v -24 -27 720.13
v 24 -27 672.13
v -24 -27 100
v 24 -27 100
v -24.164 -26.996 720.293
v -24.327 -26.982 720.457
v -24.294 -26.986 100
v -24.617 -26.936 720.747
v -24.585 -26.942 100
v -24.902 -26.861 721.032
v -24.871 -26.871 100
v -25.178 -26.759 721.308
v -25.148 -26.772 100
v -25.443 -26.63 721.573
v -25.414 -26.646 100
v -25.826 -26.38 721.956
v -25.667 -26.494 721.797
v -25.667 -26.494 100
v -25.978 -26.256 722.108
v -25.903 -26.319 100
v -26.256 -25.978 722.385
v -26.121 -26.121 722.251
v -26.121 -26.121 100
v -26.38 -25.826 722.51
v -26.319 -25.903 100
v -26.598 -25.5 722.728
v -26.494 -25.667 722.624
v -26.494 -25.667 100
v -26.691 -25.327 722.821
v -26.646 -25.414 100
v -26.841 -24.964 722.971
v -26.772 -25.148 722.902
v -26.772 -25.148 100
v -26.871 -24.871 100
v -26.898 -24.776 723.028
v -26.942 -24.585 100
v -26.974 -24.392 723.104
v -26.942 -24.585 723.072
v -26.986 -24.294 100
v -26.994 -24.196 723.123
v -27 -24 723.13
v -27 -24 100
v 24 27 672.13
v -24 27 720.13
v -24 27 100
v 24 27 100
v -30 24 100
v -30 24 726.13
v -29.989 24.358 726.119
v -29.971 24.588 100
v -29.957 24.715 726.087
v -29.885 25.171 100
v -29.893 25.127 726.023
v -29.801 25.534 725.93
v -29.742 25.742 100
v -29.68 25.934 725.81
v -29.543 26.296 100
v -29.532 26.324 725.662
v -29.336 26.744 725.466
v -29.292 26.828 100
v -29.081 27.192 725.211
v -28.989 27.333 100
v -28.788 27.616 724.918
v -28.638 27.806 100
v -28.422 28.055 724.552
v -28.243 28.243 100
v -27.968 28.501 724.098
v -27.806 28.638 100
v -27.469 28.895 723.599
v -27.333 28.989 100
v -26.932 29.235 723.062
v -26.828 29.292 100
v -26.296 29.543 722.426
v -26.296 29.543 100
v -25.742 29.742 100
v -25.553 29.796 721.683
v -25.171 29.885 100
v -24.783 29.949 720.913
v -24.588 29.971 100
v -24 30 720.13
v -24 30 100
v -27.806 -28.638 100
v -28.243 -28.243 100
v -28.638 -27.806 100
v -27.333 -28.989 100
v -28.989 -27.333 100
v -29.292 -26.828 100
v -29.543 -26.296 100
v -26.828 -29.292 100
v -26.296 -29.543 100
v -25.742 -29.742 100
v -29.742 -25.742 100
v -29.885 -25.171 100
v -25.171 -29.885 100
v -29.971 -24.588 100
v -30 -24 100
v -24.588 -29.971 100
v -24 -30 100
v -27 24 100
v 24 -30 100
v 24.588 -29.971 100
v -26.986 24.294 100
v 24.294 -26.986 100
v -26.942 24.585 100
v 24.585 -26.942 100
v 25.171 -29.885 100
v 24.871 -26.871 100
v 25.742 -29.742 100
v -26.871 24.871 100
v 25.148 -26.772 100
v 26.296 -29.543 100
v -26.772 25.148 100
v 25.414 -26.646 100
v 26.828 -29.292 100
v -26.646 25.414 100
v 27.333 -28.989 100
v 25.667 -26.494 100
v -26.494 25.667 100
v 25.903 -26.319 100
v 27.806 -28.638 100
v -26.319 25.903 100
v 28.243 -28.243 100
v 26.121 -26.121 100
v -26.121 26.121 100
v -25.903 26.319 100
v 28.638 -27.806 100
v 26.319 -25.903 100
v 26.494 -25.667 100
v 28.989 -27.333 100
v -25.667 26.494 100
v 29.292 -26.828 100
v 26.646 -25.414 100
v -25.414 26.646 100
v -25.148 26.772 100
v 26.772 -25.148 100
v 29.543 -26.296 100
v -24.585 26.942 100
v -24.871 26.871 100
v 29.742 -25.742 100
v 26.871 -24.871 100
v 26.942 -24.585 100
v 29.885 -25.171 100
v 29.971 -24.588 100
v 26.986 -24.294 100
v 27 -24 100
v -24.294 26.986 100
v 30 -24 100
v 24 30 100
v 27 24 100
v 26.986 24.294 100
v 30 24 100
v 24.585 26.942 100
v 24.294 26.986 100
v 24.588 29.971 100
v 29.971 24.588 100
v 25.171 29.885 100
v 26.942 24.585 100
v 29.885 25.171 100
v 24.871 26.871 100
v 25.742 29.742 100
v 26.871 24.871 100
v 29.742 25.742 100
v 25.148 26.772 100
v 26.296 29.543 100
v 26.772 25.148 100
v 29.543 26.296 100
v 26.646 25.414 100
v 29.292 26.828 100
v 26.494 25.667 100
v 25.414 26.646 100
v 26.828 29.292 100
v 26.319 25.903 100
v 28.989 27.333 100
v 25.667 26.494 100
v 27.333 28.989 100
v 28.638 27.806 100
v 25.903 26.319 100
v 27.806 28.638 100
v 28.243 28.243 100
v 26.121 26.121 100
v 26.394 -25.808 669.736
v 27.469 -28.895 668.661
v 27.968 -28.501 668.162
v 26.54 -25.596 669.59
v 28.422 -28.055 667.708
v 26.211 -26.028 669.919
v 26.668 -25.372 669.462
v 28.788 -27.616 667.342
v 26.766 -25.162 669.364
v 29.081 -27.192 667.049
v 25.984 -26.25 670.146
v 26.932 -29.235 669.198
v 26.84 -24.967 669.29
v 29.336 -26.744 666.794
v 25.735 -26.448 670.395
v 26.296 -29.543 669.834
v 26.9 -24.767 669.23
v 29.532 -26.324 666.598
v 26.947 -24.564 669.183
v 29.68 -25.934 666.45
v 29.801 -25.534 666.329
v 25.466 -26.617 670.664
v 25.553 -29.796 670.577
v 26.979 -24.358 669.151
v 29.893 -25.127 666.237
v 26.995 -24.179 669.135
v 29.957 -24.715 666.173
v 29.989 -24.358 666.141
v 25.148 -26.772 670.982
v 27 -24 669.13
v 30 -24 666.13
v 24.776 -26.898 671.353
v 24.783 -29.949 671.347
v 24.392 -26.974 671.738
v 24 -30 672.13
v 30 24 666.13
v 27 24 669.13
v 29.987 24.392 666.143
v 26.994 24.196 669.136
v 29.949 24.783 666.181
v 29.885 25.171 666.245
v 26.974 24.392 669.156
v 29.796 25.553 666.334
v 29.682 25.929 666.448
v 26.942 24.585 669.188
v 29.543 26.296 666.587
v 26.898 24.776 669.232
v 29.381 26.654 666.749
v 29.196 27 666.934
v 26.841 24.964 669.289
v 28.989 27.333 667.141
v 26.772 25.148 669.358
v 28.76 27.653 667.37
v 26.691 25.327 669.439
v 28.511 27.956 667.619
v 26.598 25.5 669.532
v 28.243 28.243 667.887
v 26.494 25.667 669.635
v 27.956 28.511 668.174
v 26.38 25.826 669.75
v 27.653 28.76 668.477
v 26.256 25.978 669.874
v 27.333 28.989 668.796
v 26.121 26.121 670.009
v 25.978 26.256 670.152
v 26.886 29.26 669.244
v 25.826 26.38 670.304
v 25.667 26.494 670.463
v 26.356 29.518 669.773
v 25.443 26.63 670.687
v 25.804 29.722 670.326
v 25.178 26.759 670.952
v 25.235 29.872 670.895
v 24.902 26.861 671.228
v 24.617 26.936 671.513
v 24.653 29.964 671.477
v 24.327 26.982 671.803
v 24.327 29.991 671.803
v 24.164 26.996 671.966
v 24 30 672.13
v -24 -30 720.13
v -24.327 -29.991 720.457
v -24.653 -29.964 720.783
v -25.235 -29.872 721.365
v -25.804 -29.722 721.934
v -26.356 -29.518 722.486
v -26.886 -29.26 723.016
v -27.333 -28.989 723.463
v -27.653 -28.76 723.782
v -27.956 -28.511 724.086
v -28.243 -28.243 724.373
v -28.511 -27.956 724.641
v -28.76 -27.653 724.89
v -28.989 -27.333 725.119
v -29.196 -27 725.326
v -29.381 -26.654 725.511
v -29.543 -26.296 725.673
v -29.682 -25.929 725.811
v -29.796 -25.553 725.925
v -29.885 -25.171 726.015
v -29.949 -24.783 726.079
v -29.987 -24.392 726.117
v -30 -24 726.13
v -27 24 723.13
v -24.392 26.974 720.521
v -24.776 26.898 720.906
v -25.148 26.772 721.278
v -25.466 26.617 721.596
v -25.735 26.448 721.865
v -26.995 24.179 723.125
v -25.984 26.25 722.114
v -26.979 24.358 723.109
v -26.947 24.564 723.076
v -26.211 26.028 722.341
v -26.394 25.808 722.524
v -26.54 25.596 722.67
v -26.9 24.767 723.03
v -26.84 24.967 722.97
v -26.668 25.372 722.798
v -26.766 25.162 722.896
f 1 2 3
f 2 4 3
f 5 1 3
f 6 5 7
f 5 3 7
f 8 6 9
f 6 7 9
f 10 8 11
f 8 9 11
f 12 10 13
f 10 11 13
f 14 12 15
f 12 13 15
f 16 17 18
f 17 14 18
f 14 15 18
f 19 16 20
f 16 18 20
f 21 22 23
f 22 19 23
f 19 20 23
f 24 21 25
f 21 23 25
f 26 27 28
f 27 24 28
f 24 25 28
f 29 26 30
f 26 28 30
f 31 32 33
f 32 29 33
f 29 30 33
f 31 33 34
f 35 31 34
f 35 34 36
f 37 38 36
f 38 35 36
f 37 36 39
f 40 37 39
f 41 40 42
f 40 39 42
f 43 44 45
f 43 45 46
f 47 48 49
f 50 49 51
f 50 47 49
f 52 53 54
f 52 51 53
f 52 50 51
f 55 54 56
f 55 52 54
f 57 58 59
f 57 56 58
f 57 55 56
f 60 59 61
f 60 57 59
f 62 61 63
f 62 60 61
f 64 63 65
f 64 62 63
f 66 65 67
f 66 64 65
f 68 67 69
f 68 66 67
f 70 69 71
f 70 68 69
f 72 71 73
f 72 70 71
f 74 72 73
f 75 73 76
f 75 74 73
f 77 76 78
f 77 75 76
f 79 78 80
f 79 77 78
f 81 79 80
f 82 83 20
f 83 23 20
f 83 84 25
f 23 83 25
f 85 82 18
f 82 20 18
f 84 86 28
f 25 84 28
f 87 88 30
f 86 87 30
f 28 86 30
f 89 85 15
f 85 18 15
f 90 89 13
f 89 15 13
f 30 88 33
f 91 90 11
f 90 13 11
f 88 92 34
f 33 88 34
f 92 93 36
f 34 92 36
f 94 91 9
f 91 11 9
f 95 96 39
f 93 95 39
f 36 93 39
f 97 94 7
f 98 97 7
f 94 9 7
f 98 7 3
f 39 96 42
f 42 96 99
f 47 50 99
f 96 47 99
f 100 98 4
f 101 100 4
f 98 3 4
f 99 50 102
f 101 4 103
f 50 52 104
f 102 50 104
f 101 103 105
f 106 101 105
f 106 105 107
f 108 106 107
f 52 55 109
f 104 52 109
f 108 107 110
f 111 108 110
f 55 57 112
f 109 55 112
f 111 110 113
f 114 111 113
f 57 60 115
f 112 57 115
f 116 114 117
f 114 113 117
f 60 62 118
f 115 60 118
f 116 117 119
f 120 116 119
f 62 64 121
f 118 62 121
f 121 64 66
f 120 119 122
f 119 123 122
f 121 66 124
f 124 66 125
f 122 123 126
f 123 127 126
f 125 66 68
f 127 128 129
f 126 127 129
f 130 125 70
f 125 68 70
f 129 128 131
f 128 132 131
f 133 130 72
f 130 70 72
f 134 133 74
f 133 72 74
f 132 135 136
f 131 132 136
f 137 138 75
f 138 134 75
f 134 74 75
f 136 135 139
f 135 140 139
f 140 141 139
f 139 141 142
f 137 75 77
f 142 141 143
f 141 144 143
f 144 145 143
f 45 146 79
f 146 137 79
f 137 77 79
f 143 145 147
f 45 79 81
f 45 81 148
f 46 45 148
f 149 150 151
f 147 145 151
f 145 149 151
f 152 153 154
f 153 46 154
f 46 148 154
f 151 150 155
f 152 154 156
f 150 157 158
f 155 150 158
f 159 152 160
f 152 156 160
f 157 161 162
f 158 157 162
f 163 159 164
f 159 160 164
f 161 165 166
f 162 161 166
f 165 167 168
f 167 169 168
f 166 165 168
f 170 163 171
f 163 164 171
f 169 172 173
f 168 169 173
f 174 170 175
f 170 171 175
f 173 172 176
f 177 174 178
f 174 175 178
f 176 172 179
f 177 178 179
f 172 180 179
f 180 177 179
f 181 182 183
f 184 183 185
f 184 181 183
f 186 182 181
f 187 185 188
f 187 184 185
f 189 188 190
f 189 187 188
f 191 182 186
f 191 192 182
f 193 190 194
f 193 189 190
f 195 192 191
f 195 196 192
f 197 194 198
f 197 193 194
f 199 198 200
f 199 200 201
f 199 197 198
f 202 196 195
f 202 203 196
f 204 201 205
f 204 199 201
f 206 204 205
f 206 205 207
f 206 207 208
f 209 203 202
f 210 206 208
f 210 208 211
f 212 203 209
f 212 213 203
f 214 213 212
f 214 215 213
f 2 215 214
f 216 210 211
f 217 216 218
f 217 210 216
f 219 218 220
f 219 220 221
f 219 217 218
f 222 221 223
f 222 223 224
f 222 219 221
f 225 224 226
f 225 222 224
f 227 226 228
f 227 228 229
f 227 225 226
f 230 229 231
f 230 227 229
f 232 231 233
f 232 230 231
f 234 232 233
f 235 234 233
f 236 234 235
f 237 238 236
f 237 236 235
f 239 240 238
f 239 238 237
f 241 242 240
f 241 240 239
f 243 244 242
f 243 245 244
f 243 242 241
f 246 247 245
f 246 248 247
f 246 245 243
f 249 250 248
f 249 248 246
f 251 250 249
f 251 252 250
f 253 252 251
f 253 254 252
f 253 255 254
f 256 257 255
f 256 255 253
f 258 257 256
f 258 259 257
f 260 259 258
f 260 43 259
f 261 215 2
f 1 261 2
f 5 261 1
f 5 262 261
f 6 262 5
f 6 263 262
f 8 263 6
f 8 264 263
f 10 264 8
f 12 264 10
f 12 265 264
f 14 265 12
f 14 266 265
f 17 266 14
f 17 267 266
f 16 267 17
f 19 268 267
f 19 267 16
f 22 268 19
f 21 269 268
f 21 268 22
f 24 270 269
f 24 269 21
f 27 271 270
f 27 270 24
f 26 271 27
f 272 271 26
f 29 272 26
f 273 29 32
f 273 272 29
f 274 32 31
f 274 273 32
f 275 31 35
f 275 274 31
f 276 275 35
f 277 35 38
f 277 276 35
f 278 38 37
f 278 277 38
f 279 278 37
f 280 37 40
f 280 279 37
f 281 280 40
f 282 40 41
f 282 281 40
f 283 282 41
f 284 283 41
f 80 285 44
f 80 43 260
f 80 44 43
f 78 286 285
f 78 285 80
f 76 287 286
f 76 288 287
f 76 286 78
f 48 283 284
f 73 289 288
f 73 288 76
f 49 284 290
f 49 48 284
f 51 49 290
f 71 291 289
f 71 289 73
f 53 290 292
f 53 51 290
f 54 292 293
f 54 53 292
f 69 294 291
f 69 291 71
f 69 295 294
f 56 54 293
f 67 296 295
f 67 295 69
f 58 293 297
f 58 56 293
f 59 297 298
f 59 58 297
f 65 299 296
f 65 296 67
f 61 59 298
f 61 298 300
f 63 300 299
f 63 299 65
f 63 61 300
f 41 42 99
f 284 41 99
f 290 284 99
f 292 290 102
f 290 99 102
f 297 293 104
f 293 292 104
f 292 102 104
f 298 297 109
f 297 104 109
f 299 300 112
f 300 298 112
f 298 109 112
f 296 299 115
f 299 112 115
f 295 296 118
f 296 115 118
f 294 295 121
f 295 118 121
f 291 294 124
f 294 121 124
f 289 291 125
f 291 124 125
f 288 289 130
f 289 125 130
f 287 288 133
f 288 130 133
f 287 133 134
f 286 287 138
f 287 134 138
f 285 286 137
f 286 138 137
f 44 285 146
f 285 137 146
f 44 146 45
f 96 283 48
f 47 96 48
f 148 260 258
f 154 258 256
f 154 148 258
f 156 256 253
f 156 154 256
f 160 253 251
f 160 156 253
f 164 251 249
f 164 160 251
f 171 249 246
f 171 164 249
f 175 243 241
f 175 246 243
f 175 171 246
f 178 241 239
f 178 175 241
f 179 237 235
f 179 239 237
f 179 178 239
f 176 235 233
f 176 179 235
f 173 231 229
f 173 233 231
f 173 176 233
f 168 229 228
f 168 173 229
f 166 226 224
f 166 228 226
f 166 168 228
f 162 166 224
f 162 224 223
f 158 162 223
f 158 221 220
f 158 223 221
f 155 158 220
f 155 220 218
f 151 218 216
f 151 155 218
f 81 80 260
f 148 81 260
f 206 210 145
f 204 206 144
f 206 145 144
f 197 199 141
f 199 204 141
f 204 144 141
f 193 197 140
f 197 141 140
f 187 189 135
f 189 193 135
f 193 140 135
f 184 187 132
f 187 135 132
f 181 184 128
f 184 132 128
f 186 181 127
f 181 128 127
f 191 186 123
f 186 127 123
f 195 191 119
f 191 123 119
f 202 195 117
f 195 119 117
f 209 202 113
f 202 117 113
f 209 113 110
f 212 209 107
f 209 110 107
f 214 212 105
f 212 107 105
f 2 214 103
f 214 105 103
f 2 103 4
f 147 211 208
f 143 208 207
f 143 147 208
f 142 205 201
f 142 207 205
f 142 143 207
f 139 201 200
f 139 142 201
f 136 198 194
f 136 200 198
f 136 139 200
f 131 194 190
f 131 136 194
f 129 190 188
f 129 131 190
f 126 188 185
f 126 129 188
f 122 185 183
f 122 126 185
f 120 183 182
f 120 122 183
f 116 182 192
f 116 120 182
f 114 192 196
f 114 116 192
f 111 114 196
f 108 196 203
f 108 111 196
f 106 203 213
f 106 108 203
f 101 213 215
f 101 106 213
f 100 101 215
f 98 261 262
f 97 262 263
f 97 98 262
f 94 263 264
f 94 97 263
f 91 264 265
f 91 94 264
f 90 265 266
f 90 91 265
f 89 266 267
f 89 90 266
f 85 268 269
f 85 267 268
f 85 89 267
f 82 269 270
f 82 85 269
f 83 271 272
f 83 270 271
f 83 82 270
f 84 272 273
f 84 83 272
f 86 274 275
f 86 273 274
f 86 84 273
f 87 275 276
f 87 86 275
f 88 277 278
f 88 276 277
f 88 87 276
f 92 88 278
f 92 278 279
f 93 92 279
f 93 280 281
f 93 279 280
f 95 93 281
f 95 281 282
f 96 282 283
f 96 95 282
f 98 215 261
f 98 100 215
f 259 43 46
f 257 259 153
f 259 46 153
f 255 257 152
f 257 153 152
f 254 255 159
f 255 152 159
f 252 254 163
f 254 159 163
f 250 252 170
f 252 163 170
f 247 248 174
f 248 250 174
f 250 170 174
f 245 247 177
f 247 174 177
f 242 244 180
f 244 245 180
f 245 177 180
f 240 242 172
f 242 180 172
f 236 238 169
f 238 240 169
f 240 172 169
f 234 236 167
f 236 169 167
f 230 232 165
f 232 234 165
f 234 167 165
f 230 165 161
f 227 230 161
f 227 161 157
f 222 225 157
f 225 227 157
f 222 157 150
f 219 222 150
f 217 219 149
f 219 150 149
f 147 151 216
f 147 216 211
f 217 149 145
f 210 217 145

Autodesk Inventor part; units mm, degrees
ref_plane "Start Plane" through (0, 0, 100) normal (0, 0, 1) x (1, 0, 0)
ref_plane "End Plane" through (0, 0, 726.1299) normal (0, 0, 1) x (1, 0, 0)
sketch "Sketch" plane through (0, 0, 0) normal (0, 0, 1) x (1, 0, 0)
  line L0 (-30, -24) -> (-30, 24)
  line L1 (-24, 30) -> (24, 30)
  line L2 (30, 24) -> (30, -24)
  line L3 (24, -30) -> (-24, -30)
  arc A0 (-30, -24) -> (-24, -30) centre (-24, -24) ccw
  arc A1 (30, 24) -> (24, 30) centre (24, 24) ccw
  arc A2 (-24, 30) -> (-30, 24) centre (-24, 24) ccw
  arc A3 (24, -30) -> (30, -24) centre (24, -24) ccw
  arc A4 (-24, 27) -> (-27, 24) centre (-24, 24) ccw
  line L4 (-24, 27) -> (24, 27)
  arc A5 (27, 24) -> (24, 27) centre (24, 24) ccw
  line L5 (27, 24) -> (27, -24)
  arc A6 (24, -27) -> (27, -24) centre (24, -24) ccw
  line L6 (24, -27) -> (-24, -27)
  arc A7 (-27, -24) -> (-24, -27) centre (-24, -24) ccw
  line L7 (-27, -24) -> (-27, 24)
  line L8 (0, 43.7397) -> (0, -43.7397) construction
  line L9 (-43.7397, 0) -> (43.7397, 0) construction
  dimension "d7" = 6
  dimension "d9" = 60
  dimension "d11" = 60
  dimension "d12" = 3
  dimension "d15" = 30
  dimension "d16" = 30
extrude "Body" add sketch "Sketch" along normal up to surface (626.1299 mm away) from surface at 100
sketch "Sketch3" plane through (0, 0, 0) normal (0, 0, 1) x (1, 0, 0)
  line L0 (0, 0) -> (10, 0)
ref_plane "Work Plane3" through (0, 0, 0) normal (0, -1, 0) x (1, 0, 0)
ref_plane "Work Plane4" through (696.1299, -24, 0) normal (0.7071, 0, 0.7071) x (0.7071, 0, -0.7071)
split "Split1" plane through (696.1299, -24, 0) removes the side toward (0.7071, 0, 0.7071)
sketch "Sketch4" plane through (0, 0, 0) normal (0, -1, 0) x (1, 0, 0)
  line L0 (-2, 100) -> (12, 100) projected
  line L1 (-2, 726.1299) -> (12, 726.1299) projected
  dimension "d18" = 626.1299
equation "\"d7\" = G_IR"
equation "\"d9\" = G_W"
equation "\"d11\" = G_H"
equation "\"d12\" = G_T"
equation "\"d15\" = 0.5 * d9"
equation "\"d16\" = 0.5 * d11"
equation "\"d3\" = G_L"
equation "\"G_W\" = 60"
equation "\"G_H\" = 60"
equation "\"G_T\" = 3"
equation "\"G_IR\" = 6"
equation "\"G_L\" = d18"
equation "\"G_OFFSET_END\" = 0"
equation "\"d14\" = G_OFFSET_END + B_L"
equation "\"B_L\" = 726.12992"
properties part number "ISO 10799-2 - 60x60x3 - 626,13" material "Steel, Mild"
